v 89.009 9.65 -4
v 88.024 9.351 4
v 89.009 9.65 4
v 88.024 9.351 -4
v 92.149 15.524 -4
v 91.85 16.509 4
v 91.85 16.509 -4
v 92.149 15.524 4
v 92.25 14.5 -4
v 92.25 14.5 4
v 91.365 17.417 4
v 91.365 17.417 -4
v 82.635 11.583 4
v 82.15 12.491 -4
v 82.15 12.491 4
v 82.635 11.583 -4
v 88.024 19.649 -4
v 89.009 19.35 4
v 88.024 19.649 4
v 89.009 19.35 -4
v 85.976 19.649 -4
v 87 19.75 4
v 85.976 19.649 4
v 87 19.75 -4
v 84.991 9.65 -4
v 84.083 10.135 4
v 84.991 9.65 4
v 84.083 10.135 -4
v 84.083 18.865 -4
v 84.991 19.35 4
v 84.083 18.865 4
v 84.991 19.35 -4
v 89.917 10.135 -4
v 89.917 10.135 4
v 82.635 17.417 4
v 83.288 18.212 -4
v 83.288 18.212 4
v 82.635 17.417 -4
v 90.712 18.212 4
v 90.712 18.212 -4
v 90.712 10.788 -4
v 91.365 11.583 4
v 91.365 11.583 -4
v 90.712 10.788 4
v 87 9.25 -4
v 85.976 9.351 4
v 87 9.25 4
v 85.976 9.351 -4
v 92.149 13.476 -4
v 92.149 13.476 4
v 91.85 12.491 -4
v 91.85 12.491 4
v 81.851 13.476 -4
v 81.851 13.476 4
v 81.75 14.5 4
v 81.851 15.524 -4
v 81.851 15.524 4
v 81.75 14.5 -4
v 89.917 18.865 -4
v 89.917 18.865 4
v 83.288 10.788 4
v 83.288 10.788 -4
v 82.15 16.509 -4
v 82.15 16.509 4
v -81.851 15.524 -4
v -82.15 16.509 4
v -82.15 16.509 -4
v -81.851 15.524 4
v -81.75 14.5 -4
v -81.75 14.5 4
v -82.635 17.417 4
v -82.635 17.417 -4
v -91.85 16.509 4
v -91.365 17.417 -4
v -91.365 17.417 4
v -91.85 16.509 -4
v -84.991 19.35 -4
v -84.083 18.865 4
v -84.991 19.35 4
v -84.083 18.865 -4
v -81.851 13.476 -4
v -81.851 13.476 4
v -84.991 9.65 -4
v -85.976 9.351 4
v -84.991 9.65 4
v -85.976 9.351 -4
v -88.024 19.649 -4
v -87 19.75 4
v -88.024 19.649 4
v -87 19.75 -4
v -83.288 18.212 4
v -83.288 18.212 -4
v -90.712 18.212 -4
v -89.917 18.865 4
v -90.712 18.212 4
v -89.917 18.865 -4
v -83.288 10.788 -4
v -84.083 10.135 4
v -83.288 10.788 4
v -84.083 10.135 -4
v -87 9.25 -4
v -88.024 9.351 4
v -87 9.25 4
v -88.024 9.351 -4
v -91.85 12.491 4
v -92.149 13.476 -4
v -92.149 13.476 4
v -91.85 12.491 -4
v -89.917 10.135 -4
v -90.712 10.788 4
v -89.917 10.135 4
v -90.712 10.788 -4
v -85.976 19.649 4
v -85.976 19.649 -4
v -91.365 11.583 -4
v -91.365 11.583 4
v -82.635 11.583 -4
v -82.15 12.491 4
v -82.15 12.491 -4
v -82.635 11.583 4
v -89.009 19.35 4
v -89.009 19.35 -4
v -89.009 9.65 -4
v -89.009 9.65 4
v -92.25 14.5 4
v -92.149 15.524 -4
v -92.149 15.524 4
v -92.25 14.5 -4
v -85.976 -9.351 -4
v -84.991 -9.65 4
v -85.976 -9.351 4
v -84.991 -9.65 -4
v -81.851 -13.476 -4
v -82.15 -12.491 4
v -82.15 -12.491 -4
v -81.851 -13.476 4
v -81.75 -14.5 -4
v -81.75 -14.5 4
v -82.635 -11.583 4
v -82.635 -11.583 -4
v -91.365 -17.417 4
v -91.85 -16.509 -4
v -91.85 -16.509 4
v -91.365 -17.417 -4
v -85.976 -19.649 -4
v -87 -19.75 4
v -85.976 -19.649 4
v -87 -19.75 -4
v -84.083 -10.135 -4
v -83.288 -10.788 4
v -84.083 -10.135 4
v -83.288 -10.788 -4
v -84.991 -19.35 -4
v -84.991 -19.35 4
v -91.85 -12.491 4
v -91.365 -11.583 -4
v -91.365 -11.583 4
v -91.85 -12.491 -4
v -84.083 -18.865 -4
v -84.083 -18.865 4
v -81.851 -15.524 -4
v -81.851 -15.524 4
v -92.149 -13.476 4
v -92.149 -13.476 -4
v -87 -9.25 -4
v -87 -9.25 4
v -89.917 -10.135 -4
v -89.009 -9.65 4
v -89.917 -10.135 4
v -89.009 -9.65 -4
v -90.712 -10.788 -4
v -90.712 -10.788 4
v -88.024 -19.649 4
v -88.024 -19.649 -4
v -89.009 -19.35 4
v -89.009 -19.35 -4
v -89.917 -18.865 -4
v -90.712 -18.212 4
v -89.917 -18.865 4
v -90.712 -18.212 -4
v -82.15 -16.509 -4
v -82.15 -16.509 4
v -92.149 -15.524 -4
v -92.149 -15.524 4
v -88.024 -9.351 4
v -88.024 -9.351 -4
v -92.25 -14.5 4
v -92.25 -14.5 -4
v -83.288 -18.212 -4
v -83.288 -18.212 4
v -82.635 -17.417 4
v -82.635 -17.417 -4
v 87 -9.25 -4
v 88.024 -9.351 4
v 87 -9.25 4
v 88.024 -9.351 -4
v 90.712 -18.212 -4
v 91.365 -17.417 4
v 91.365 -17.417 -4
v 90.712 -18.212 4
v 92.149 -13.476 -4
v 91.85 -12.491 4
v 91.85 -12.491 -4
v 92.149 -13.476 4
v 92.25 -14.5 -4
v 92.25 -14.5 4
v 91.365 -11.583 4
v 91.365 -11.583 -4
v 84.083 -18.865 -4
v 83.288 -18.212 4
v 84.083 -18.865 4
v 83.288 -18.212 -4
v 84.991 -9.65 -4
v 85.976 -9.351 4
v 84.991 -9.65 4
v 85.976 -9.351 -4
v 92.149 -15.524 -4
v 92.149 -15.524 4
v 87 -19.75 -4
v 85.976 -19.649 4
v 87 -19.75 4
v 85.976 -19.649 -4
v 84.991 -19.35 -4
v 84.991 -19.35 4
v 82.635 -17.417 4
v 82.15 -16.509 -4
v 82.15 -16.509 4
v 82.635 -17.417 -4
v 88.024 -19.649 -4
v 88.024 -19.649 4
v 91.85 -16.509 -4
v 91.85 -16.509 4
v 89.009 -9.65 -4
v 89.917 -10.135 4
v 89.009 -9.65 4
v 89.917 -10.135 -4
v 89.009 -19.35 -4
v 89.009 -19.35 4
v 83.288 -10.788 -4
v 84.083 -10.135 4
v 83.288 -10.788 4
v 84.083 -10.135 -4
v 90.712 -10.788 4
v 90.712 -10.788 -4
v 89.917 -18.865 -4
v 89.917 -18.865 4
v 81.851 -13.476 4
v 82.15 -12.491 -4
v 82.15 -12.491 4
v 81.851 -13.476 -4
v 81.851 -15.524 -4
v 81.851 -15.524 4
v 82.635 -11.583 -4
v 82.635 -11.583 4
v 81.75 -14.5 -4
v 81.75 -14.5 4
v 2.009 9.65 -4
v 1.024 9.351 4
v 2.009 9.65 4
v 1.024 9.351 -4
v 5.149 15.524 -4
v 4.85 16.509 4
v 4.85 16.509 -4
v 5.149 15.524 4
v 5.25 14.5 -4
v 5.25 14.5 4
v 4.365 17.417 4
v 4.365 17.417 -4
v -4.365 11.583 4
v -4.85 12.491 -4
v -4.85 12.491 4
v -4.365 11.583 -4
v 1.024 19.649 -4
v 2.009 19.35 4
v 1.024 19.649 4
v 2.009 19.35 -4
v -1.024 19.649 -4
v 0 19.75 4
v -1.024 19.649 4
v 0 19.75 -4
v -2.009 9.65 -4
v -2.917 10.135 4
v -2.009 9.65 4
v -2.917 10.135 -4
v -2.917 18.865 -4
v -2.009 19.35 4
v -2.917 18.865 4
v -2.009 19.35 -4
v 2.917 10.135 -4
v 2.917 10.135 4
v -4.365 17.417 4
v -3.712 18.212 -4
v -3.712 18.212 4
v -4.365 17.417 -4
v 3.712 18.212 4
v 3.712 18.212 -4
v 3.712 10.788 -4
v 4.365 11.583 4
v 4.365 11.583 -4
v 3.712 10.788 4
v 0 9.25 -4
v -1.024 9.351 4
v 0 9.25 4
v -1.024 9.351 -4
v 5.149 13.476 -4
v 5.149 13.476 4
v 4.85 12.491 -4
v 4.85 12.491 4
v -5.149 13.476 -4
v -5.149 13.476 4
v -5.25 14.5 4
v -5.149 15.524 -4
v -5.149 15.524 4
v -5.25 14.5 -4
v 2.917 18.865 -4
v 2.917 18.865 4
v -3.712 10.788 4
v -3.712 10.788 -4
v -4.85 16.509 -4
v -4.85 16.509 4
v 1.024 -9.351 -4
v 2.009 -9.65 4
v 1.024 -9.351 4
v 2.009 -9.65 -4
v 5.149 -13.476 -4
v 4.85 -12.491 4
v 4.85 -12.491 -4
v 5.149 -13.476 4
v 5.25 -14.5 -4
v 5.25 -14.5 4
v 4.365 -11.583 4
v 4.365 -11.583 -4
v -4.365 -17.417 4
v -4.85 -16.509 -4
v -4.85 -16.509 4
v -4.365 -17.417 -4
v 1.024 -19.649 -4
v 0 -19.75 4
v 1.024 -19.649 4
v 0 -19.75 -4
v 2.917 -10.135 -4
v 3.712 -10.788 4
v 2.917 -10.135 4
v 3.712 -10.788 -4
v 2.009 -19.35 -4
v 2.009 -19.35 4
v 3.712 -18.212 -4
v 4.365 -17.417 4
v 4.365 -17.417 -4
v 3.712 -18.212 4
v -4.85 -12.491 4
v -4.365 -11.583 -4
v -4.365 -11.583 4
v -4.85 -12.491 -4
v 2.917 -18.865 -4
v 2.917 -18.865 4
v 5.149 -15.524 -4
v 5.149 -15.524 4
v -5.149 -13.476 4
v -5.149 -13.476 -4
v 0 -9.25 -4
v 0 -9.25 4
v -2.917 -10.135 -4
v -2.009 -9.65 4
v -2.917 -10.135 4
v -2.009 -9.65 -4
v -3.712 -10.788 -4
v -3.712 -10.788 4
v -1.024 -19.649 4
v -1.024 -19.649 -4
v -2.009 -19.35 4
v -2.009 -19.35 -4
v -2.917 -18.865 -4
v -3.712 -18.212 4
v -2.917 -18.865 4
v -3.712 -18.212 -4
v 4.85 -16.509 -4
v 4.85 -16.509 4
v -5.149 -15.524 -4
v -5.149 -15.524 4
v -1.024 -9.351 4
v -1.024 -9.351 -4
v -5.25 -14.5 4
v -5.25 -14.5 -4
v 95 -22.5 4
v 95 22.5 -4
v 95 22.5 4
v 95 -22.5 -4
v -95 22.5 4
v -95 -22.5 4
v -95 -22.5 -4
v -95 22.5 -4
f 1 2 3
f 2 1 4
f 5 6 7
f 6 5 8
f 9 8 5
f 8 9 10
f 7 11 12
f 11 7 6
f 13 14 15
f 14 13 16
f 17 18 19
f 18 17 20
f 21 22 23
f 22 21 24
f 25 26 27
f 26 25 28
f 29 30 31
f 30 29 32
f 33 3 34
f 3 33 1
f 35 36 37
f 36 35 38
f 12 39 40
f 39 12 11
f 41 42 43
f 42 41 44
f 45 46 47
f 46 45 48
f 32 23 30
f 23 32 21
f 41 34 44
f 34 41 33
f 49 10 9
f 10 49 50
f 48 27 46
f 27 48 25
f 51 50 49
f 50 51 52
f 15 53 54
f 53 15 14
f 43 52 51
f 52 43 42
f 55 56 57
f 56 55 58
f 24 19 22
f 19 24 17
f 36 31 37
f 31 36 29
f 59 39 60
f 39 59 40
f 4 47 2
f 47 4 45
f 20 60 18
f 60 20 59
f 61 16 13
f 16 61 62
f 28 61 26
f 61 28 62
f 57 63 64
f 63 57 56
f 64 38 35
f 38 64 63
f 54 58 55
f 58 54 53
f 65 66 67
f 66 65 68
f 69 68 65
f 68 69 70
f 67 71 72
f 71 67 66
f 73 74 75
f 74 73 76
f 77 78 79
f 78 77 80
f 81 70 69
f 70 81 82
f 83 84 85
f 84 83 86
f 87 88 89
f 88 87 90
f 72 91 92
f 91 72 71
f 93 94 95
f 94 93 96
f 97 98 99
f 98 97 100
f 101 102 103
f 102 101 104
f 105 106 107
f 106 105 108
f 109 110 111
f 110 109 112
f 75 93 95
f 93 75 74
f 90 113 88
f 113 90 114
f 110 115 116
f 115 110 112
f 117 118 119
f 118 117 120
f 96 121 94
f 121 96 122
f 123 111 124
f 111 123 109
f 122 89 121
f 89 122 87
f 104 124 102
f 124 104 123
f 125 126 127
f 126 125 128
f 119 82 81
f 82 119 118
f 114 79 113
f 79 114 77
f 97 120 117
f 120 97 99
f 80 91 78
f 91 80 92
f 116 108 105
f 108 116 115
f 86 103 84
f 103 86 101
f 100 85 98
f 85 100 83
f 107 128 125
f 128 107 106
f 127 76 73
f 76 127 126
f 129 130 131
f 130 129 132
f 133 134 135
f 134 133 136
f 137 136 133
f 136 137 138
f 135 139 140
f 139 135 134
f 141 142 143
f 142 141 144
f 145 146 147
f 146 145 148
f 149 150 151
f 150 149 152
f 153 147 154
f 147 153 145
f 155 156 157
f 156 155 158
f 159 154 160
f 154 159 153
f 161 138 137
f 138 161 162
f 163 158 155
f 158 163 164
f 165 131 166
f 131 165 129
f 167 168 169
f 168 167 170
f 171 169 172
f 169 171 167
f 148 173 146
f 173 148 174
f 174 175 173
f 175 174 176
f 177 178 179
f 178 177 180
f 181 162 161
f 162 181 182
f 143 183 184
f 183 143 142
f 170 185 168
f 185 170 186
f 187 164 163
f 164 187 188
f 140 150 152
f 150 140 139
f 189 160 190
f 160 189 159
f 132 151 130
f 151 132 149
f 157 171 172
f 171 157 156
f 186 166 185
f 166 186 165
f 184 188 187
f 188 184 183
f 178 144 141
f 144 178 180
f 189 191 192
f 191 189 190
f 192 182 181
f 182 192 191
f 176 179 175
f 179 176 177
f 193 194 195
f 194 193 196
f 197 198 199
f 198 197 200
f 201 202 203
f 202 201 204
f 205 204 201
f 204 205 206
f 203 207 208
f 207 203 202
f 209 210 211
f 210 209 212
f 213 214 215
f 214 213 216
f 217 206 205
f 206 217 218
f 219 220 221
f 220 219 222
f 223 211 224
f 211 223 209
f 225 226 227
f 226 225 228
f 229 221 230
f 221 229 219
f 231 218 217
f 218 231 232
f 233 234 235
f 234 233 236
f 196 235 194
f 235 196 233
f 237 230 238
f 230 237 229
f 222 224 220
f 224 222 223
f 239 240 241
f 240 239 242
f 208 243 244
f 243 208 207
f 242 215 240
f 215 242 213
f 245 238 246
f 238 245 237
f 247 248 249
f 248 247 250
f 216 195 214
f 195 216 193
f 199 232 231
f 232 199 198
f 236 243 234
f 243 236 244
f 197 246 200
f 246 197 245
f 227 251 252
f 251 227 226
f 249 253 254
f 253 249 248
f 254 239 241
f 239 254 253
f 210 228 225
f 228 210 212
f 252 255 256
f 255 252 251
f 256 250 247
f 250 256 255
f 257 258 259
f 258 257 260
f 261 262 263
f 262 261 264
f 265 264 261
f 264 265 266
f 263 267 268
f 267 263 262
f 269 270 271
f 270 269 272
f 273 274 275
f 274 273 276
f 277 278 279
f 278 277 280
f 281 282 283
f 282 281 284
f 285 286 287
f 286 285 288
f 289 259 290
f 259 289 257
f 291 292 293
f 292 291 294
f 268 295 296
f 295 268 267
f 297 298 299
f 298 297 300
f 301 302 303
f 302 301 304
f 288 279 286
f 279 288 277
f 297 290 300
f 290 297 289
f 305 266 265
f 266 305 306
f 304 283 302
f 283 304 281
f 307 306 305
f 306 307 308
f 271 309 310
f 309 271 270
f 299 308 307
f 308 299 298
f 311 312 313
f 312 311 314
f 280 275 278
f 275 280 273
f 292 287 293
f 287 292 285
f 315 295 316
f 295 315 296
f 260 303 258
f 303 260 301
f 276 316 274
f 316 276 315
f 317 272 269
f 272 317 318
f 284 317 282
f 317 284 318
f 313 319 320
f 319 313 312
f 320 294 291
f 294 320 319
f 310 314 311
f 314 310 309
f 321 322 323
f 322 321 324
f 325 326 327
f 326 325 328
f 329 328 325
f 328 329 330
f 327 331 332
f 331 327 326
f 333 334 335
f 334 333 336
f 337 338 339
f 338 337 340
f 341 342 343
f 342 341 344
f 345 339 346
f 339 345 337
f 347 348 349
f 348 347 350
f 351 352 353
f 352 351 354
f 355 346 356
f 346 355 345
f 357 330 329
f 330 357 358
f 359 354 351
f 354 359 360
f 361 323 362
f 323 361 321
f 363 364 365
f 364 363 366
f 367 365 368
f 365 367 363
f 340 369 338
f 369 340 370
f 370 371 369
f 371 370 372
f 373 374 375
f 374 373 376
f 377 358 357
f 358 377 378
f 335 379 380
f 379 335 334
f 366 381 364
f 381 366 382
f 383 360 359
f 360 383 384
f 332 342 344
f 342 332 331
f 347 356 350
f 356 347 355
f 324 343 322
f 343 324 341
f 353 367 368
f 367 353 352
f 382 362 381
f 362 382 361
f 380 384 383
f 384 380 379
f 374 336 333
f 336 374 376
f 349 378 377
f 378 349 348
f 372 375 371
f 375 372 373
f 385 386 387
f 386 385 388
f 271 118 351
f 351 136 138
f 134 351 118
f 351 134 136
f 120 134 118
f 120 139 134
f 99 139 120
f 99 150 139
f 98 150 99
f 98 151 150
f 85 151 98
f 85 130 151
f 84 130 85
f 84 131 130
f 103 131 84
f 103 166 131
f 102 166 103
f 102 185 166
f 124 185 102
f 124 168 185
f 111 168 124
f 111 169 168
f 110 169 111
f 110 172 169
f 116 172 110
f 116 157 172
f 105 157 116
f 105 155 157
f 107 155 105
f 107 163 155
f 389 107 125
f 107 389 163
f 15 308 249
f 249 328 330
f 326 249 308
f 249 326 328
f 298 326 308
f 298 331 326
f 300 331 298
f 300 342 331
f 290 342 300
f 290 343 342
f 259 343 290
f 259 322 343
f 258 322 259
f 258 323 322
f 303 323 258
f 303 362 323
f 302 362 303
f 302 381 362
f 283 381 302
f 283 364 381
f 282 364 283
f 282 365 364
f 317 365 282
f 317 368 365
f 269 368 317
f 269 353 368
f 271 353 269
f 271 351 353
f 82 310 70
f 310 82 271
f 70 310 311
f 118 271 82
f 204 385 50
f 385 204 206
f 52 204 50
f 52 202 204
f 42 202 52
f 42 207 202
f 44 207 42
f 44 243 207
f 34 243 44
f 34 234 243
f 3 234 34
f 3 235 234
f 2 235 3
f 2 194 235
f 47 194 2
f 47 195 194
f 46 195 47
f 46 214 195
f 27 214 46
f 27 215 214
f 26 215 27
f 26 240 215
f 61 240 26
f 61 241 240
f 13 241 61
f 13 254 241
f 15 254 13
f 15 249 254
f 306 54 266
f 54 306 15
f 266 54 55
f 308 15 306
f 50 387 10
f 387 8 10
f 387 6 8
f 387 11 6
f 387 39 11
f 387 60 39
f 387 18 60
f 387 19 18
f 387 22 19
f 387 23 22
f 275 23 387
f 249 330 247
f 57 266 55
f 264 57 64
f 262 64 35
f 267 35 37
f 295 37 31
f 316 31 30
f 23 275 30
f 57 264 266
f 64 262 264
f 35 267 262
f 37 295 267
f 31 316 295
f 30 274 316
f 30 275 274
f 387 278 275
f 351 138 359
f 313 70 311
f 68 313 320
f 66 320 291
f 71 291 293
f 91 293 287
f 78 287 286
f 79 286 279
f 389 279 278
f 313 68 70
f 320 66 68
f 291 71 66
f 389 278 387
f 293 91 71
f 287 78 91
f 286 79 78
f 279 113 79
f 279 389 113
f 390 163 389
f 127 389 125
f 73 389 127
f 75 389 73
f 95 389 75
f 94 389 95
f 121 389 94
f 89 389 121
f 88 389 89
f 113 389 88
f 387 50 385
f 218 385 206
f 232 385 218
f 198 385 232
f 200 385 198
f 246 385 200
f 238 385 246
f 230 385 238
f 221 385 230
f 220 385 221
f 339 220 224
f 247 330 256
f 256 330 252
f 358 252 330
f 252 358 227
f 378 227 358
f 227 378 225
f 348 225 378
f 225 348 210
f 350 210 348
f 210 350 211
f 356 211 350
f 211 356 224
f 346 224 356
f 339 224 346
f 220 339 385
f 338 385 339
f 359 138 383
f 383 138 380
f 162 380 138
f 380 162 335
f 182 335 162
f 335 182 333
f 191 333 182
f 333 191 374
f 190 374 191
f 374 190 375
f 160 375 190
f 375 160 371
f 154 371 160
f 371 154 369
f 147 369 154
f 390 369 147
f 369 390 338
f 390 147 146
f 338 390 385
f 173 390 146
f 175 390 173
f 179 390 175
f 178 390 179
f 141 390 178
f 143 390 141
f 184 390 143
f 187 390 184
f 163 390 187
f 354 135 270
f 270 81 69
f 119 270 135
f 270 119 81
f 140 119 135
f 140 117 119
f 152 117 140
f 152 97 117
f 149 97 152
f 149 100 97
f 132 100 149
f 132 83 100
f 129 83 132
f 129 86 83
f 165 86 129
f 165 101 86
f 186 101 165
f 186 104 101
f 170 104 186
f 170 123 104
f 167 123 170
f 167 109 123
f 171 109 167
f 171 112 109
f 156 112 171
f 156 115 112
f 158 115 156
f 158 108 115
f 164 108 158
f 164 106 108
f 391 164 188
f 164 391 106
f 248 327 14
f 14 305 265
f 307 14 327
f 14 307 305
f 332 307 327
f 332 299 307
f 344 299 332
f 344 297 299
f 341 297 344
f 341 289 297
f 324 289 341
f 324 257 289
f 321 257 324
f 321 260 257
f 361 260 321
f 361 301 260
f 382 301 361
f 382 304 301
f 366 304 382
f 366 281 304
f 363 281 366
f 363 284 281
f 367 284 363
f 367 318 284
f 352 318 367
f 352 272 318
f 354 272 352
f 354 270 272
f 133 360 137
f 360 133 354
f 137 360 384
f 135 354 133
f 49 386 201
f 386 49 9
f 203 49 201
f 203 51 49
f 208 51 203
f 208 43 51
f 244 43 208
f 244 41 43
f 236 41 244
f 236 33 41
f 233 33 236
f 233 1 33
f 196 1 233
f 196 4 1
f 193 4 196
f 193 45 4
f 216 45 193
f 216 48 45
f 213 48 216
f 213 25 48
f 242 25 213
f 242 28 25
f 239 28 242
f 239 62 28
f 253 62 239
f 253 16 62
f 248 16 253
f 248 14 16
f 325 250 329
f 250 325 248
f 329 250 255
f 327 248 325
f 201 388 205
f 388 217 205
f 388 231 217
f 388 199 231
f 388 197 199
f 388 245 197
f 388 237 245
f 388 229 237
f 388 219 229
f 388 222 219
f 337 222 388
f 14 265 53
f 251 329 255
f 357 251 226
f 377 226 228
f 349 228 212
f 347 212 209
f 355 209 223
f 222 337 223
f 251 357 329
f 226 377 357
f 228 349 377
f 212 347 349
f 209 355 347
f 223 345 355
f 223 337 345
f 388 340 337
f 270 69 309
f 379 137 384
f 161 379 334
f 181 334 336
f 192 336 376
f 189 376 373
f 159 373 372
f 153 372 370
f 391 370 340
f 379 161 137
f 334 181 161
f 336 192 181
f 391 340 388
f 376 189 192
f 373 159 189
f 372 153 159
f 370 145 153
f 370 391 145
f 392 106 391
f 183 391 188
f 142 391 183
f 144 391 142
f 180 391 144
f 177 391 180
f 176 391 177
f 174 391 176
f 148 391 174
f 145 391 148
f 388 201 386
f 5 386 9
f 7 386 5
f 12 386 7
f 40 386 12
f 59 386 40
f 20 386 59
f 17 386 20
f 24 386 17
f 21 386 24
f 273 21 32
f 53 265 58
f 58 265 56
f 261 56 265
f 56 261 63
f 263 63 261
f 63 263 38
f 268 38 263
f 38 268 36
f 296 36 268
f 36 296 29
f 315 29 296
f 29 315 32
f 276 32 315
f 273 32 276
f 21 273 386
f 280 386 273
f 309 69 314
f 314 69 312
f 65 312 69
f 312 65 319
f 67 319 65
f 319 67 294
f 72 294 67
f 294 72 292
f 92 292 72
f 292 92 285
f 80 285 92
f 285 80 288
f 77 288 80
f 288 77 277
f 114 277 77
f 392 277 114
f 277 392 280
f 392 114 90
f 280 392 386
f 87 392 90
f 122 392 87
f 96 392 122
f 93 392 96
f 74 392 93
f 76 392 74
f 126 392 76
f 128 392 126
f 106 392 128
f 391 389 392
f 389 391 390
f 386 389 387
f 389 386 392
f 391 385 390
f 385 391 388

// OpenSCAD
$fn = 32;

// ----------------------------------------------------------------------
// Corner plate 190 x 45 x 8
// 6 holes, centres taken from the edge offset
// ----------------------------------------------------------------------

// --- parameters (mm) ---
plate = [190, 45, 8];  // overall size (x, y, z)
holes = 6;             // number of holes the drawing asks for
hole_d = 10.5;         // hole diameter
edge = 8;              // hole centre offset from the plate edge

// --- derived feature positions (mm) ---
corner_x = plate[0] / 2 - edge;  // = 87   corner hole X
corner_y = plate[1] / 2 - edge;  // = 14.5   corner hole Y
feature_centers = [
  [corner_x, corner_y],
  [-corner_x, corner_y],
  [-corner_x, -corner_y],
  [corner_x, -corner_y],
  [0, corner_y],
  [0, -corner_y]
];   // hole centres the loop below drills

// plate outline, every hole drilled through with the same cutters
difference() {
  cube(plate, center = true);
  for (centre = feature_centers)
    translate([centre[0], centre[1], 0])
      cylinder(d = hole_d, h = plate[2] + 2, center = true);
}
